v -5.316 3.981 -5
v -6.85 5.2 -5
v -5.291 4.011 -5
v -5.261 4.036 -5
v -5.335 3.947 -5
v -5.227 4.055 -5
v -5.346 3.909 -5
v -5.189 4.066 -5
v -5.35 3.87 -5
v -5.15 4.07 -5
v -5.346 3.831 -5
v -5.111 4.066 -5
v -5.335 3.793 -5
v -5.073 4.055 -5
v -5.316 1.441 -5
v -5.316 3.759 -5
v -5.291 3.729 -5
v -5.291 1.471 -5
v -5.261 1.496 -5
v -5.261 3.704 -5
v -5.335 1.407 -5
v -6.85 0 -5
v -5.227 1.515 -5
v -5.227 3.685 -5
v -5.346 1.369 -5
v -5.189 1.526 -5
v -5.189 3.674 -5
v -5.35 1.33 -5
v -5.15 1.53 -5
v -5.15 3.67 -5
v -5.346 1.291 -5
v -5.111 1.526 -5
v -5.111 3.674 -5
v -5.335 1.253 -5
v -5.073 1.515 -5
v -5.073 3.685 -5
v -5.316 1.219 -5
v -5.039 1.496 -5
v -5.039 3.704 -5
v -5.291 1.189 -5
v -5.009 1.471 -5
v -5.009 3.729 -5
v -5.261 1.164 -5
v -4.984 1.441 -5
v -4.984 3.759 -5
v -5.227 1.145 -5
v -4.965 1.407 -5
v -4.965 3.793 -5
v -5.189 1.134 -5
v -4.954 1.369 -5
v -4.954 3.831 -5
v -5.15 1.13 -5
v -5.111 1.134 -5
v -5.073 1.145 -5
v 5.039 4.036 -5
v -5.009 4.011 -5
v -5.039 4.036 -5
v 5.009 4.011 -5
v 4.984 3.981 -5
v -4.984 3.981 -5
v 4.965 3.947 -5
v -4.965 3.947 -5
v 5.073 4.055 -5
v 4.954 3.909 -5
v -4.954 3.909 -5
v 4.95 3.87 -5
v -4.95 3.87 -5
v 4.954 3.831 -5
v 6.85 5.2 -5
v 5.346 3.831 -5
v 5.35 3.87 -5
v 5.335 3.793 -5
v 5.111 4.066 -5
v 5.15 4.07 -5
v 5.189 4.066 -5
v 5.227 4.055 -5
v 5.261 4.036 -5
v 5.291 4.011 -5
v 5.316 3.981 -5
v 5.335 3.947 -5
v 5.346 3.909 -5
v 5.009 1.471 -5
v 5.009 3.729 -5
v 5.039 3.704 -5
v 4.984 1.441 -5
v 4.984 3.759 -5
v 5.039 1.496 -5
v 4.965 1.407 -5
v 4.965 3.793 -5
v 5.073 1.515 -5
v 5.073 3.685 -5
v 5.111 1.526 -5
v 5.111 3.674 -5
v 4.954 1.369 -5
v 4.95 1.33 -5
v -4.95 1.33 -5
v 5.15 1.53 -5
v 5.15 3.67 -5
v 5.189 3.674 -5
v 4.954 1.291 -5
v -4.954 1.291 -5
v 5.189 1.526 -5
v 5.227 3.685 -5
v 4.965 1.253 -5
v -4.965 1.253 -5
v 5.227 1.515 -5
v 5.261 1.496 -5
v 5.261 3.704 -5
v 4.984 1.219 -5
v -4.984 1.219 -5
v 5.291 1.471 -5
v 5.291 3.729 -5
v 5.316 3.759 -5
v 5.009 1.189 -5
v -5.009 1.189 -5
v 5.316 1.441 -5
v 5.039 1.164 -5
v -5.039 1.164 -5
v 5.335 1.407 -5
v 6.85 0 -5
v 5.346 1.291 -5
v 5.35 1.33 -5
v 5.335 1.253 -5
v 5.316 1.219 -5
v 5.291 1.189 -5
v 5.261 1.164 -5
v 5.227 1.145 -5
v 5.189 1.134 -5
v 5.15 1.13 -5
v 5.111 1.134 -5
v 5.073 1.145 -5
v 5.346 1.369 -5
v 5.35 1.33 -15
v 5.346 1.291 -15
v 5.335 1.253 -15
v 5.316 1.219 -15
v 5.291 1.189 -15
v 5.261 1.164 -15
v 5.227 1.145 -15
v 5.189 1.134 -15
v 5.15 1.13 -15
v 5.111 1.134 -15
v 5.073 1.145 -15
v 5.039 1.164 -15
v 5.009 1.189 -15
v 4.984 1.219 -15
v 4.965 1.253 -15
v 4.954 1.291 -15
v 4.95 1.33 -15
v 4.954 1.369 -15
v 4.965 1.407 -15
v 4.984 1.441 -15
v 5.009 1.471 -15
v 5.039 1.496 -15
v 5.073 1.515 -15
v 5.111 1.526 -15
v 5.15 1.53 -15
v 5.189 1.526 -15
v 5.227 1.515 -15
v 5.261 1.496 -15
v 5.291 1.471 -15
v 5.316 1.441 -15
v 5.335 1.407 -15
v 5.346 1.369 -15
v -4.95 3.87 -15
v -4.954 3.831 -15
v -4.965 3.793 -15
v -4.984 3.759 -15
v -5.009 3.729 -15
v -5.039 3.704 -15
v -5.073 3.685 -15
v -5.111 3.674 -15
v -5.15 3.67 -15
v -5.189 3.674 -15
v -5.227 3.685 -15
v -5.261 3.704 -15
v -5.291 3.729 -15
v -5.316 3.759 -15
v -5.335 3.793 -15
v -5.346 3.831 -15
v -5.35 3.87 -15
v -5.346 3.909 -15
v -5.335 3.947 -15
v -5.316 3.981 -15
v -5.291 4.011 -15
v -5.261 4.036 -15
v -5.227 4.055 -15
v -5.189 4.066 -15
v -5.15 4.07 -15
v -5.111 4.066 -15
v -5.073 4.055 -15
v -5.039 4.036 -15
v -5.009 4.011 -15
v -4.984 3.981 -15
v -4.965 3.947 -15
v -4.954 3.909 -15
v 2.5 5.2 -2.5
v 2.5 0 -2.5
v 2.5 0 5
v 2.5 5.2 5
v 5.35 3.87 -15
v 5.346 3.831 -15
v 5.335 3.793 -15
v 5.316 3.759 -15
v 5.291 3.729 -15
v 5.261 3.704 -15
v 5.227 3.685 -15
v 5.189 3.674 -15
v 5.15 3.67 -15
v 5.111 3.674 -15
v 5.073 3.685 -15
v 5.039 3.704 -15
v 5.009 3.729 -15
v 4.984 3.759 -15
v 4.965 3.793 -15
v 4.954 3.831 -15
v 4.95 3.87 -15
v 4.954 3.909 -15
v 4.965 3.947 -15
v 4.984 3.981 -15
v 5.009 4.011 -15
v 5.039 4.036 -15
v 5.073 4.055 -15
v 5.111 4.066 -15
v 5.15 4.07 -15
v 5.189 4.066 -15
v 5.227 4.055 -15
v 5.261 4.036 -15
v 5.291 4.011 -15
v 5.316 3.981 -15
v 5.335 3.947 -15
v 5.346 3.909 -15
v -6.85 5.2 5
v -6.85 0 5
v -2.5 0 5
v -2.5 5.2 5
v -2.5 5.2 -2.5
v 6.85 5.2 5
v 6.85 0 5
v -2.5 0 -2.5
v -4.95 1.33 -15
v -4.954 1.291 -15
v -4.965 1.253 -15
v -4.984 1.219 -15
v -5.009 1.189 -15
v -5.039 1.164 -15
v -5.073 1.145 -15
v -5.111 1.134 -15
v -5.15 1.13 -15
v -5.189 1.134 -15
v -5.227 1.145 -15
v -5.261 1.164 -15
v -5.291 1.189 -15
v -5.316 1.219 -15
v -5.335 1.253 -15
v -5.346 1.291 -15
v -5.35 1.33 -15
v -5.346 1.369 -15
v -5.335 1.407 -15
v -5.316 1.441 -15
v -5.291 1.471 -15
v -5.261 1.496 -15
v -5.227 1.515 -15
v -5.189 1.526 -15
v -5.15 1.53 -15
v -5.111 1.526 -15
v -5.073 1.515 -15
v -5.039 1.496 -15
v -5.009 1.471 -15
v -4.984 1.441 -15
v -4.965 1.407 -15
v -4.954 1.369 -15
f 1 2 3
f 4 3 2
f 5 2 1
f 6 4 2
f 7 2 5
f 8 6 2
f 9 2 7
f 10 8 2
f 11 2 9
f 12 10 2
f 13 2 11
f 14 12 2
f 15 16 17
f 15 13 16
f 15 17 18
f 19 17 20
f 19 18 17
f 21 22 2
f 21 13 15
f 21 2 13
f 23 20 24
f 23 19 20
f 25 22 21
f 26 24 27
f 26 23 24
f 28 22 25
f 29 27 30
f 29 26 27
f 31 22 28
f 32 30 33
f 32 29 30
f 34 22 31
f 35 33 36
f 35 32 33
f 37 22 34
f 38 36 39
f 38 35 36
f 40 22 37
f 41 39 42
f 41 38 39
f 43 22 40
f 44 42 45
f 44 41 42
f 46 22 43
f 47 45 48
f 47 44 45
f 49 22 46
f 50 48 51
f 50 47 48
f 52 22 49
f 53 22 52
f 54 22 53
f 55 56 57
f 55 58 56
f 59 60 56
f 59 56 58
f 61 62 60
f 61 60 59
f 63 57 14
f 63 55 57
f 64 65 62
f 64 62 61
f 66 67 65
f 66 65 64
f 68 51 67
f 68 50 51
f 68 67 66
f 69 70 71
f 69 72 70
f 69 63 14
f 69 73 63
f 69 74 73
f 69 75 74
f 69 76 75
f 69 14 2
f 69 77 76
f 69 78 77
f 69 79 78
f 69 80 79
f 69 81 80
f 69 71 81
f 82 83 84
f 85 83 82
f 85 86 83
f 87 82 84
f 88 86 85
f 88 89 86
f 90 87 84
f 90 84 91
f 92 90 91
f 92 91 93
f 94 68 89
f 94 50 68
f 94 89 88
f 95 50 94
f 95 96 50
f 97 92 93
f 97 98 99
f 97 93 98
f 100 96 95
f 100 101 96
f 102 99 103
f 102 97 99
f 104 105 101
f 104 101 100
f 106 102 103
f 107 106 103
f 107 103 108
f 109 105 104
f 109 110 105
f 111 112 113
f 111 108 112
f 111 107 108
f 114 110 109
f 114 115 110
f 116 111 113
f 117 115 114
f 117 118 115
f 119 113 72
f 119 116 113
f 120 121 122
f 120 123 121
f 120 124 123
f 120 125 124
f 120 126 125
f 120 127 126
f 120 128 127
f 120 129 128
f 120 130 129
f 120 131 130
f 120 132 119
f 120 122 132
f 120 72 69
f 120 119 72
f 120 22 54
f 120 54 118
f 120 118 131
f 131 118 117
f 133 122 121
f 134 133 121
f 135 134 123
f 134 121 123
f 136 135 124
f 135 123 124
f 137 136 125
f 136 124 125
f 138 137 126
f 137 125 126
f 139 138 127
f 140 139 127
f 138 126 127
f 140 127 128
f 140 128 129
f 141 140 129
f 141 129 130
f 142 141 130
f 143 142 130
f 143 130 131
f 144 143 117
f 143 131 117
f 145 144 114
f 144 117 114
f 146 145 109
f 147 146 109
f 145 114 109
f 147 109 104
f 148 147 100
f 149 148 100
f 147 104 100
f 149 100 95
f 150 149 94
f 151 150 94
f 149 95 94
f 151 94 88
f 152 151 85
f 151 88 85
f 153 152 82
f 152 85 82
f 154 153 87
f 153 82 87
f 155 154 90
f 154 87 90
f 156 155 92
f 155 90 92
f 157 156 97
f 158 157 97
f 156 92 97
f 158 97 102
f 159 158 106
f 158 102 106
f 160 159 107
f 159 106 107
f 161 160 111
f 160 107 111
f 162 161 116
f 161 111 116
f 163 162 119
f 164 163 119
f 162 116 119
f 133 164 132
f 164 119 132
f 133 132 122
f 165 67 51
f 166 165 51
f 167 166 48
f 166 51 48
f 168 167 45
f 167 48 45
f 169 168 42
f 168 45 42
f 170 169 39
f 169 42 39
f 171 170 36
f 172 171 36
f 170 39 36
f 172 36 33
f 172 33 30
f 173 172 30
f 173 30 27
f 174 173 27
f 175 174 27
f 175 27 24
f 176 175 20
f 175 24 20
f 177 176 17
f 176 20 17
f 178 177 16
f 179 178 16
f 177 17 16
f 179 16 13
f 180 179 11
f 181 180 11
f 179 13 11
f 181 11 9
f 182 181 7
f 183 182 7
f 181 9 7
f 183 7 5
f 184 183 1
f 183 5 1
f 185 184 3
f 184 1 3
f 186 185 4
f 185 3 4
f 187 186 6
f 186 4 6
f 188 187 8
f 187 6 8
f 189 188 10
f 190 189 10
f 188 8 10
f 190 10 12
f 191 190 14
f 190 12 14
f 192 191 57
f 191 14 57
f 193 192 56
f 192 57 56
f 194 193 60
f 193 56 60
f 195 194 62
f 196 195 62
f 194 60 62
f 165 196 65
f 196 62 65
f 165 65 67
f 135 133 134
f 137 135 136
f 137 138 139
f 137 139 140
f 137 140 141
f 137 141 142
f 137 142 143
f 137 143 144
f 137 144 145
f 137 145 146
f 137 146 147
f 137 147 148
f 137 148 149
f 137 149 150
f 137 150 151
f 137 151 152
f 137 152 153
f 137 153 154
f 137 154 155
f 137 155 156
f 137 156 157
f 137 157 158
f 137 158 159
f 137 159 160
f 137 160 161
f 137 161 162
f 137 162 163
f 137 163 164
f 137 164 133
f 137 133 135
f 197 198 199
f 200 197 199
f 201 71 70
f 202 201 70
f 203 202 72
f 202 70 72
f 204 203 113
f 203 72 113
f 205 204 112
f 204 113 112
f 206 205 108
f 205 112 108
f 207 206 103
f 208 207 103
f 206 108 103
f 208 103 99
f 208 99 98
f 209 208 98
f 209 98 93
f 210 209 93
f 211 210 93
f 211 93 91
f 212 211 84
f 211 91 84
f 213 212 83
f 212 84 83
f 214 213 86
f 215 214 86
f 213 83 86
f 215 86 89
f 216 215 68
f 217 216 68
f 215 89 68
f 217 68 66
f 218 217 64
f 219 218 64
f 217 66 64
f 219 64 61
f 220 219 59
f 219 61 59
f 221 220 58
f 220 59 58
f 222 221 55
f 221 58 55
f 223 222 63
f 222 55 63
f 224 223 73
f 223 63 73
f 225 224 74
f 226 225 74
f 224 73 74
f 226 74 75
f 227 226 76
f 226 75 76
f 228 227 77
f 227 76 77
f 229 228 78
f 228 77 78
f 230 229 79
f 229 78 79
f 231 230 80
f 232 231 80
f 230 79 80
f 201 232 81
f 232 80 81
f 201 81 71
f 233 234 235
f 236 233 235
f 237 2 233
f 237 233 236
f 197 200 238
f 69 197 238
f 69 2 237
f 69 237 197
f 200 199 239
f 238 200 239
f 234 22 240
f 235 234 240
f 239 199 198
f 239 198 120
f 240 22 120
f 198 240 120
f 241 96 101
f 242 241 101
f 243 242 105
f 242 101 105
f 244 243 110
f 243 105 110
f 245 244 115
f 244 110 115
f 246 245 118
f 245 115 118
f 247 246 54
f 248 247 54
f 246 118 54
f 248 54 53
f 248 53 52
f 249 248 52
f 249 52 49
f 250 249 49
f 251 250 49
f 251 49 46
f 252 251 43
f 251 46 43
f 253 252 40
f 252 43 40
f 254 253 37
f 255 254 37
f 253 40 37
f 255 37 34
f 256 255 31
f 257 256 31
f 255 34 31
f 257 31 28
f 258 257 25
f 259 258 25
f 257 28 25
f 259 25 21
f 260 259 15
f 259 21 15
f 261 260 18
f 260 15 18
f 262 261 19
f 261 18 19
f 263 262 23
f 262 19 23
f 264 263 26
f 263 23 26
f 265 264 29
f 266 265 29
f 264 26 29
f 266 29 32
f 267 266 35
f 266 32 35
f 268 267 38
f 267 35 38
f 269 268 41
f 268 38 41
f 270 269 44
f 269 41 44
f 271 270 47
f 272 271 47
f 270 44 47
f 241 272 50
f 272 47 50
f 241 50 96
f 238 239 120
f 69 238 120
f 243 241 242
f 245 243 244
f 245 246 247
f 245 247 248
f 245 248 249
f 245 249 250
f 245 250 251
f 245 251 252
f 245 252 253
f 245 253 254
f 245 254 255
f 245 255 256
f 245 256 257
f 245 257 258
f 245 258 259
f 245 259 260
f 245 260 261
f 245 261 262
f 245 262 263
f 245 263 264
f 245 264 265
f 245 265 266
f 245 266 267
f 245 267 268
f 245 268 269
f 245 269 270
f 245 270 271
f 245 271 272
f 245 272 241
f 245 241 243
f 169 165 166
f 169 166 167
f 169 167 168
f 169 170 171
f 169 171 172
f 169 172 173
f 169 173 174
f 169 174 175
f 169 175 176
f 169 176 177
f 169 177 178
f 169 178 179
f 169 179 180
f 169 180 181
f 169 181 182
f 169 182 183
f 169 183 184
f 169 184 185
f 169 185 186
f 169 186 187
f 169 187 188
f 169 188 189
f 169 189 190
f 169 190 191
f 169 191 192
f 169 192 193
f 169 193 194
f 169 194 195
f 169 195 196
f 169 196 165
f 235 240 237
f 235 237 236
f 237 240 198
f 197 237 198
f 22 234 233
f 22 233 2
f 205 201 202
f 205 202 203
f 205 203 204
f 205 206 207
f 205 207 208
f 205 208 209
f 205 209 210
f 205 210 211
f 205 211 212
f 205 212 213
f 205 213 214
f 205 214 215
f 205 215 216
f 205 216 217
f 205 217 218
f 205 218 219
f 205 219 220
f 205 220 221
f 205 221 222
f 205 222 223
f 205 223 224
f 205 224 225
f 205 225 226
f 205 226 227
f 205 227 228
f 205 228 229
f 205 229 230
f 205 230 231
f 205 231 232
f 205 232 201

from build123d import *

# Parameters (mm, degrees)
SKETCH1_W           = 13.7
SKETCH1_H           = 10
BOSS_EXTRUDE1_DEPTH = 5.2
SKETCH2_W           = 5
SKETCH2_H           = 7.5
CUT_EXTRUDE1_DEPTH  = 10.947989747
SKETCH3_R           = 0.2
BOSS_EXTRUDE2_DEPTH = 10


with BuildPart() as part:
    # Sketch1 → Boss-Extrude1 (new body)
    with BuildSketch(Plane(origin=(0, 0, 0), x_dir=(1, 0, 0), z_dir=(0, 1, 0))):
        Rectangle(SKETCH1_W, SKETCH1_H)
    extrude(amount=BOSS_EXTRUDE1_DEPTH)

    # Sketch2 → Cut-Extrude1 (cut, through all)
    with BuildSketch(Plane.XZ):
        with Locations((0, 1.25)):
            Rectangle(SKETCH2_W, SKETCH2_H)
    extrude(amount=-CUT_EXTRUDE1_DEPTH, mode=Mode.SUBTRACT)

    # Sketch3 → Boss-Extrude2 (add)
    with BuildSketch(Plane(origin=(0, 0, -5), x_dir=(-1, 0, 0), z_dir=(0, 0, -1))):
        with Locations(Location((-5.15, 3.87, 0), (0, 0, 180))):
            Circle(SKETCH3_R)
        with Locations(Location((-5.15, 1.33, 0), (0, 0, 180))):
            Circle(SKETCH3_R)
        with Locations(Location((5.15, 3.87, 0), (0, 0, 180))):
            Circle(SKETCH3_R)
        with Locations(Location((5.15, 1.33, 0), (0, 0, 180))):
            Circle(SKETCH3_R)
    extrude(amount=BOSS_EXTRUDE2_DEPTH)


solid = part.part
